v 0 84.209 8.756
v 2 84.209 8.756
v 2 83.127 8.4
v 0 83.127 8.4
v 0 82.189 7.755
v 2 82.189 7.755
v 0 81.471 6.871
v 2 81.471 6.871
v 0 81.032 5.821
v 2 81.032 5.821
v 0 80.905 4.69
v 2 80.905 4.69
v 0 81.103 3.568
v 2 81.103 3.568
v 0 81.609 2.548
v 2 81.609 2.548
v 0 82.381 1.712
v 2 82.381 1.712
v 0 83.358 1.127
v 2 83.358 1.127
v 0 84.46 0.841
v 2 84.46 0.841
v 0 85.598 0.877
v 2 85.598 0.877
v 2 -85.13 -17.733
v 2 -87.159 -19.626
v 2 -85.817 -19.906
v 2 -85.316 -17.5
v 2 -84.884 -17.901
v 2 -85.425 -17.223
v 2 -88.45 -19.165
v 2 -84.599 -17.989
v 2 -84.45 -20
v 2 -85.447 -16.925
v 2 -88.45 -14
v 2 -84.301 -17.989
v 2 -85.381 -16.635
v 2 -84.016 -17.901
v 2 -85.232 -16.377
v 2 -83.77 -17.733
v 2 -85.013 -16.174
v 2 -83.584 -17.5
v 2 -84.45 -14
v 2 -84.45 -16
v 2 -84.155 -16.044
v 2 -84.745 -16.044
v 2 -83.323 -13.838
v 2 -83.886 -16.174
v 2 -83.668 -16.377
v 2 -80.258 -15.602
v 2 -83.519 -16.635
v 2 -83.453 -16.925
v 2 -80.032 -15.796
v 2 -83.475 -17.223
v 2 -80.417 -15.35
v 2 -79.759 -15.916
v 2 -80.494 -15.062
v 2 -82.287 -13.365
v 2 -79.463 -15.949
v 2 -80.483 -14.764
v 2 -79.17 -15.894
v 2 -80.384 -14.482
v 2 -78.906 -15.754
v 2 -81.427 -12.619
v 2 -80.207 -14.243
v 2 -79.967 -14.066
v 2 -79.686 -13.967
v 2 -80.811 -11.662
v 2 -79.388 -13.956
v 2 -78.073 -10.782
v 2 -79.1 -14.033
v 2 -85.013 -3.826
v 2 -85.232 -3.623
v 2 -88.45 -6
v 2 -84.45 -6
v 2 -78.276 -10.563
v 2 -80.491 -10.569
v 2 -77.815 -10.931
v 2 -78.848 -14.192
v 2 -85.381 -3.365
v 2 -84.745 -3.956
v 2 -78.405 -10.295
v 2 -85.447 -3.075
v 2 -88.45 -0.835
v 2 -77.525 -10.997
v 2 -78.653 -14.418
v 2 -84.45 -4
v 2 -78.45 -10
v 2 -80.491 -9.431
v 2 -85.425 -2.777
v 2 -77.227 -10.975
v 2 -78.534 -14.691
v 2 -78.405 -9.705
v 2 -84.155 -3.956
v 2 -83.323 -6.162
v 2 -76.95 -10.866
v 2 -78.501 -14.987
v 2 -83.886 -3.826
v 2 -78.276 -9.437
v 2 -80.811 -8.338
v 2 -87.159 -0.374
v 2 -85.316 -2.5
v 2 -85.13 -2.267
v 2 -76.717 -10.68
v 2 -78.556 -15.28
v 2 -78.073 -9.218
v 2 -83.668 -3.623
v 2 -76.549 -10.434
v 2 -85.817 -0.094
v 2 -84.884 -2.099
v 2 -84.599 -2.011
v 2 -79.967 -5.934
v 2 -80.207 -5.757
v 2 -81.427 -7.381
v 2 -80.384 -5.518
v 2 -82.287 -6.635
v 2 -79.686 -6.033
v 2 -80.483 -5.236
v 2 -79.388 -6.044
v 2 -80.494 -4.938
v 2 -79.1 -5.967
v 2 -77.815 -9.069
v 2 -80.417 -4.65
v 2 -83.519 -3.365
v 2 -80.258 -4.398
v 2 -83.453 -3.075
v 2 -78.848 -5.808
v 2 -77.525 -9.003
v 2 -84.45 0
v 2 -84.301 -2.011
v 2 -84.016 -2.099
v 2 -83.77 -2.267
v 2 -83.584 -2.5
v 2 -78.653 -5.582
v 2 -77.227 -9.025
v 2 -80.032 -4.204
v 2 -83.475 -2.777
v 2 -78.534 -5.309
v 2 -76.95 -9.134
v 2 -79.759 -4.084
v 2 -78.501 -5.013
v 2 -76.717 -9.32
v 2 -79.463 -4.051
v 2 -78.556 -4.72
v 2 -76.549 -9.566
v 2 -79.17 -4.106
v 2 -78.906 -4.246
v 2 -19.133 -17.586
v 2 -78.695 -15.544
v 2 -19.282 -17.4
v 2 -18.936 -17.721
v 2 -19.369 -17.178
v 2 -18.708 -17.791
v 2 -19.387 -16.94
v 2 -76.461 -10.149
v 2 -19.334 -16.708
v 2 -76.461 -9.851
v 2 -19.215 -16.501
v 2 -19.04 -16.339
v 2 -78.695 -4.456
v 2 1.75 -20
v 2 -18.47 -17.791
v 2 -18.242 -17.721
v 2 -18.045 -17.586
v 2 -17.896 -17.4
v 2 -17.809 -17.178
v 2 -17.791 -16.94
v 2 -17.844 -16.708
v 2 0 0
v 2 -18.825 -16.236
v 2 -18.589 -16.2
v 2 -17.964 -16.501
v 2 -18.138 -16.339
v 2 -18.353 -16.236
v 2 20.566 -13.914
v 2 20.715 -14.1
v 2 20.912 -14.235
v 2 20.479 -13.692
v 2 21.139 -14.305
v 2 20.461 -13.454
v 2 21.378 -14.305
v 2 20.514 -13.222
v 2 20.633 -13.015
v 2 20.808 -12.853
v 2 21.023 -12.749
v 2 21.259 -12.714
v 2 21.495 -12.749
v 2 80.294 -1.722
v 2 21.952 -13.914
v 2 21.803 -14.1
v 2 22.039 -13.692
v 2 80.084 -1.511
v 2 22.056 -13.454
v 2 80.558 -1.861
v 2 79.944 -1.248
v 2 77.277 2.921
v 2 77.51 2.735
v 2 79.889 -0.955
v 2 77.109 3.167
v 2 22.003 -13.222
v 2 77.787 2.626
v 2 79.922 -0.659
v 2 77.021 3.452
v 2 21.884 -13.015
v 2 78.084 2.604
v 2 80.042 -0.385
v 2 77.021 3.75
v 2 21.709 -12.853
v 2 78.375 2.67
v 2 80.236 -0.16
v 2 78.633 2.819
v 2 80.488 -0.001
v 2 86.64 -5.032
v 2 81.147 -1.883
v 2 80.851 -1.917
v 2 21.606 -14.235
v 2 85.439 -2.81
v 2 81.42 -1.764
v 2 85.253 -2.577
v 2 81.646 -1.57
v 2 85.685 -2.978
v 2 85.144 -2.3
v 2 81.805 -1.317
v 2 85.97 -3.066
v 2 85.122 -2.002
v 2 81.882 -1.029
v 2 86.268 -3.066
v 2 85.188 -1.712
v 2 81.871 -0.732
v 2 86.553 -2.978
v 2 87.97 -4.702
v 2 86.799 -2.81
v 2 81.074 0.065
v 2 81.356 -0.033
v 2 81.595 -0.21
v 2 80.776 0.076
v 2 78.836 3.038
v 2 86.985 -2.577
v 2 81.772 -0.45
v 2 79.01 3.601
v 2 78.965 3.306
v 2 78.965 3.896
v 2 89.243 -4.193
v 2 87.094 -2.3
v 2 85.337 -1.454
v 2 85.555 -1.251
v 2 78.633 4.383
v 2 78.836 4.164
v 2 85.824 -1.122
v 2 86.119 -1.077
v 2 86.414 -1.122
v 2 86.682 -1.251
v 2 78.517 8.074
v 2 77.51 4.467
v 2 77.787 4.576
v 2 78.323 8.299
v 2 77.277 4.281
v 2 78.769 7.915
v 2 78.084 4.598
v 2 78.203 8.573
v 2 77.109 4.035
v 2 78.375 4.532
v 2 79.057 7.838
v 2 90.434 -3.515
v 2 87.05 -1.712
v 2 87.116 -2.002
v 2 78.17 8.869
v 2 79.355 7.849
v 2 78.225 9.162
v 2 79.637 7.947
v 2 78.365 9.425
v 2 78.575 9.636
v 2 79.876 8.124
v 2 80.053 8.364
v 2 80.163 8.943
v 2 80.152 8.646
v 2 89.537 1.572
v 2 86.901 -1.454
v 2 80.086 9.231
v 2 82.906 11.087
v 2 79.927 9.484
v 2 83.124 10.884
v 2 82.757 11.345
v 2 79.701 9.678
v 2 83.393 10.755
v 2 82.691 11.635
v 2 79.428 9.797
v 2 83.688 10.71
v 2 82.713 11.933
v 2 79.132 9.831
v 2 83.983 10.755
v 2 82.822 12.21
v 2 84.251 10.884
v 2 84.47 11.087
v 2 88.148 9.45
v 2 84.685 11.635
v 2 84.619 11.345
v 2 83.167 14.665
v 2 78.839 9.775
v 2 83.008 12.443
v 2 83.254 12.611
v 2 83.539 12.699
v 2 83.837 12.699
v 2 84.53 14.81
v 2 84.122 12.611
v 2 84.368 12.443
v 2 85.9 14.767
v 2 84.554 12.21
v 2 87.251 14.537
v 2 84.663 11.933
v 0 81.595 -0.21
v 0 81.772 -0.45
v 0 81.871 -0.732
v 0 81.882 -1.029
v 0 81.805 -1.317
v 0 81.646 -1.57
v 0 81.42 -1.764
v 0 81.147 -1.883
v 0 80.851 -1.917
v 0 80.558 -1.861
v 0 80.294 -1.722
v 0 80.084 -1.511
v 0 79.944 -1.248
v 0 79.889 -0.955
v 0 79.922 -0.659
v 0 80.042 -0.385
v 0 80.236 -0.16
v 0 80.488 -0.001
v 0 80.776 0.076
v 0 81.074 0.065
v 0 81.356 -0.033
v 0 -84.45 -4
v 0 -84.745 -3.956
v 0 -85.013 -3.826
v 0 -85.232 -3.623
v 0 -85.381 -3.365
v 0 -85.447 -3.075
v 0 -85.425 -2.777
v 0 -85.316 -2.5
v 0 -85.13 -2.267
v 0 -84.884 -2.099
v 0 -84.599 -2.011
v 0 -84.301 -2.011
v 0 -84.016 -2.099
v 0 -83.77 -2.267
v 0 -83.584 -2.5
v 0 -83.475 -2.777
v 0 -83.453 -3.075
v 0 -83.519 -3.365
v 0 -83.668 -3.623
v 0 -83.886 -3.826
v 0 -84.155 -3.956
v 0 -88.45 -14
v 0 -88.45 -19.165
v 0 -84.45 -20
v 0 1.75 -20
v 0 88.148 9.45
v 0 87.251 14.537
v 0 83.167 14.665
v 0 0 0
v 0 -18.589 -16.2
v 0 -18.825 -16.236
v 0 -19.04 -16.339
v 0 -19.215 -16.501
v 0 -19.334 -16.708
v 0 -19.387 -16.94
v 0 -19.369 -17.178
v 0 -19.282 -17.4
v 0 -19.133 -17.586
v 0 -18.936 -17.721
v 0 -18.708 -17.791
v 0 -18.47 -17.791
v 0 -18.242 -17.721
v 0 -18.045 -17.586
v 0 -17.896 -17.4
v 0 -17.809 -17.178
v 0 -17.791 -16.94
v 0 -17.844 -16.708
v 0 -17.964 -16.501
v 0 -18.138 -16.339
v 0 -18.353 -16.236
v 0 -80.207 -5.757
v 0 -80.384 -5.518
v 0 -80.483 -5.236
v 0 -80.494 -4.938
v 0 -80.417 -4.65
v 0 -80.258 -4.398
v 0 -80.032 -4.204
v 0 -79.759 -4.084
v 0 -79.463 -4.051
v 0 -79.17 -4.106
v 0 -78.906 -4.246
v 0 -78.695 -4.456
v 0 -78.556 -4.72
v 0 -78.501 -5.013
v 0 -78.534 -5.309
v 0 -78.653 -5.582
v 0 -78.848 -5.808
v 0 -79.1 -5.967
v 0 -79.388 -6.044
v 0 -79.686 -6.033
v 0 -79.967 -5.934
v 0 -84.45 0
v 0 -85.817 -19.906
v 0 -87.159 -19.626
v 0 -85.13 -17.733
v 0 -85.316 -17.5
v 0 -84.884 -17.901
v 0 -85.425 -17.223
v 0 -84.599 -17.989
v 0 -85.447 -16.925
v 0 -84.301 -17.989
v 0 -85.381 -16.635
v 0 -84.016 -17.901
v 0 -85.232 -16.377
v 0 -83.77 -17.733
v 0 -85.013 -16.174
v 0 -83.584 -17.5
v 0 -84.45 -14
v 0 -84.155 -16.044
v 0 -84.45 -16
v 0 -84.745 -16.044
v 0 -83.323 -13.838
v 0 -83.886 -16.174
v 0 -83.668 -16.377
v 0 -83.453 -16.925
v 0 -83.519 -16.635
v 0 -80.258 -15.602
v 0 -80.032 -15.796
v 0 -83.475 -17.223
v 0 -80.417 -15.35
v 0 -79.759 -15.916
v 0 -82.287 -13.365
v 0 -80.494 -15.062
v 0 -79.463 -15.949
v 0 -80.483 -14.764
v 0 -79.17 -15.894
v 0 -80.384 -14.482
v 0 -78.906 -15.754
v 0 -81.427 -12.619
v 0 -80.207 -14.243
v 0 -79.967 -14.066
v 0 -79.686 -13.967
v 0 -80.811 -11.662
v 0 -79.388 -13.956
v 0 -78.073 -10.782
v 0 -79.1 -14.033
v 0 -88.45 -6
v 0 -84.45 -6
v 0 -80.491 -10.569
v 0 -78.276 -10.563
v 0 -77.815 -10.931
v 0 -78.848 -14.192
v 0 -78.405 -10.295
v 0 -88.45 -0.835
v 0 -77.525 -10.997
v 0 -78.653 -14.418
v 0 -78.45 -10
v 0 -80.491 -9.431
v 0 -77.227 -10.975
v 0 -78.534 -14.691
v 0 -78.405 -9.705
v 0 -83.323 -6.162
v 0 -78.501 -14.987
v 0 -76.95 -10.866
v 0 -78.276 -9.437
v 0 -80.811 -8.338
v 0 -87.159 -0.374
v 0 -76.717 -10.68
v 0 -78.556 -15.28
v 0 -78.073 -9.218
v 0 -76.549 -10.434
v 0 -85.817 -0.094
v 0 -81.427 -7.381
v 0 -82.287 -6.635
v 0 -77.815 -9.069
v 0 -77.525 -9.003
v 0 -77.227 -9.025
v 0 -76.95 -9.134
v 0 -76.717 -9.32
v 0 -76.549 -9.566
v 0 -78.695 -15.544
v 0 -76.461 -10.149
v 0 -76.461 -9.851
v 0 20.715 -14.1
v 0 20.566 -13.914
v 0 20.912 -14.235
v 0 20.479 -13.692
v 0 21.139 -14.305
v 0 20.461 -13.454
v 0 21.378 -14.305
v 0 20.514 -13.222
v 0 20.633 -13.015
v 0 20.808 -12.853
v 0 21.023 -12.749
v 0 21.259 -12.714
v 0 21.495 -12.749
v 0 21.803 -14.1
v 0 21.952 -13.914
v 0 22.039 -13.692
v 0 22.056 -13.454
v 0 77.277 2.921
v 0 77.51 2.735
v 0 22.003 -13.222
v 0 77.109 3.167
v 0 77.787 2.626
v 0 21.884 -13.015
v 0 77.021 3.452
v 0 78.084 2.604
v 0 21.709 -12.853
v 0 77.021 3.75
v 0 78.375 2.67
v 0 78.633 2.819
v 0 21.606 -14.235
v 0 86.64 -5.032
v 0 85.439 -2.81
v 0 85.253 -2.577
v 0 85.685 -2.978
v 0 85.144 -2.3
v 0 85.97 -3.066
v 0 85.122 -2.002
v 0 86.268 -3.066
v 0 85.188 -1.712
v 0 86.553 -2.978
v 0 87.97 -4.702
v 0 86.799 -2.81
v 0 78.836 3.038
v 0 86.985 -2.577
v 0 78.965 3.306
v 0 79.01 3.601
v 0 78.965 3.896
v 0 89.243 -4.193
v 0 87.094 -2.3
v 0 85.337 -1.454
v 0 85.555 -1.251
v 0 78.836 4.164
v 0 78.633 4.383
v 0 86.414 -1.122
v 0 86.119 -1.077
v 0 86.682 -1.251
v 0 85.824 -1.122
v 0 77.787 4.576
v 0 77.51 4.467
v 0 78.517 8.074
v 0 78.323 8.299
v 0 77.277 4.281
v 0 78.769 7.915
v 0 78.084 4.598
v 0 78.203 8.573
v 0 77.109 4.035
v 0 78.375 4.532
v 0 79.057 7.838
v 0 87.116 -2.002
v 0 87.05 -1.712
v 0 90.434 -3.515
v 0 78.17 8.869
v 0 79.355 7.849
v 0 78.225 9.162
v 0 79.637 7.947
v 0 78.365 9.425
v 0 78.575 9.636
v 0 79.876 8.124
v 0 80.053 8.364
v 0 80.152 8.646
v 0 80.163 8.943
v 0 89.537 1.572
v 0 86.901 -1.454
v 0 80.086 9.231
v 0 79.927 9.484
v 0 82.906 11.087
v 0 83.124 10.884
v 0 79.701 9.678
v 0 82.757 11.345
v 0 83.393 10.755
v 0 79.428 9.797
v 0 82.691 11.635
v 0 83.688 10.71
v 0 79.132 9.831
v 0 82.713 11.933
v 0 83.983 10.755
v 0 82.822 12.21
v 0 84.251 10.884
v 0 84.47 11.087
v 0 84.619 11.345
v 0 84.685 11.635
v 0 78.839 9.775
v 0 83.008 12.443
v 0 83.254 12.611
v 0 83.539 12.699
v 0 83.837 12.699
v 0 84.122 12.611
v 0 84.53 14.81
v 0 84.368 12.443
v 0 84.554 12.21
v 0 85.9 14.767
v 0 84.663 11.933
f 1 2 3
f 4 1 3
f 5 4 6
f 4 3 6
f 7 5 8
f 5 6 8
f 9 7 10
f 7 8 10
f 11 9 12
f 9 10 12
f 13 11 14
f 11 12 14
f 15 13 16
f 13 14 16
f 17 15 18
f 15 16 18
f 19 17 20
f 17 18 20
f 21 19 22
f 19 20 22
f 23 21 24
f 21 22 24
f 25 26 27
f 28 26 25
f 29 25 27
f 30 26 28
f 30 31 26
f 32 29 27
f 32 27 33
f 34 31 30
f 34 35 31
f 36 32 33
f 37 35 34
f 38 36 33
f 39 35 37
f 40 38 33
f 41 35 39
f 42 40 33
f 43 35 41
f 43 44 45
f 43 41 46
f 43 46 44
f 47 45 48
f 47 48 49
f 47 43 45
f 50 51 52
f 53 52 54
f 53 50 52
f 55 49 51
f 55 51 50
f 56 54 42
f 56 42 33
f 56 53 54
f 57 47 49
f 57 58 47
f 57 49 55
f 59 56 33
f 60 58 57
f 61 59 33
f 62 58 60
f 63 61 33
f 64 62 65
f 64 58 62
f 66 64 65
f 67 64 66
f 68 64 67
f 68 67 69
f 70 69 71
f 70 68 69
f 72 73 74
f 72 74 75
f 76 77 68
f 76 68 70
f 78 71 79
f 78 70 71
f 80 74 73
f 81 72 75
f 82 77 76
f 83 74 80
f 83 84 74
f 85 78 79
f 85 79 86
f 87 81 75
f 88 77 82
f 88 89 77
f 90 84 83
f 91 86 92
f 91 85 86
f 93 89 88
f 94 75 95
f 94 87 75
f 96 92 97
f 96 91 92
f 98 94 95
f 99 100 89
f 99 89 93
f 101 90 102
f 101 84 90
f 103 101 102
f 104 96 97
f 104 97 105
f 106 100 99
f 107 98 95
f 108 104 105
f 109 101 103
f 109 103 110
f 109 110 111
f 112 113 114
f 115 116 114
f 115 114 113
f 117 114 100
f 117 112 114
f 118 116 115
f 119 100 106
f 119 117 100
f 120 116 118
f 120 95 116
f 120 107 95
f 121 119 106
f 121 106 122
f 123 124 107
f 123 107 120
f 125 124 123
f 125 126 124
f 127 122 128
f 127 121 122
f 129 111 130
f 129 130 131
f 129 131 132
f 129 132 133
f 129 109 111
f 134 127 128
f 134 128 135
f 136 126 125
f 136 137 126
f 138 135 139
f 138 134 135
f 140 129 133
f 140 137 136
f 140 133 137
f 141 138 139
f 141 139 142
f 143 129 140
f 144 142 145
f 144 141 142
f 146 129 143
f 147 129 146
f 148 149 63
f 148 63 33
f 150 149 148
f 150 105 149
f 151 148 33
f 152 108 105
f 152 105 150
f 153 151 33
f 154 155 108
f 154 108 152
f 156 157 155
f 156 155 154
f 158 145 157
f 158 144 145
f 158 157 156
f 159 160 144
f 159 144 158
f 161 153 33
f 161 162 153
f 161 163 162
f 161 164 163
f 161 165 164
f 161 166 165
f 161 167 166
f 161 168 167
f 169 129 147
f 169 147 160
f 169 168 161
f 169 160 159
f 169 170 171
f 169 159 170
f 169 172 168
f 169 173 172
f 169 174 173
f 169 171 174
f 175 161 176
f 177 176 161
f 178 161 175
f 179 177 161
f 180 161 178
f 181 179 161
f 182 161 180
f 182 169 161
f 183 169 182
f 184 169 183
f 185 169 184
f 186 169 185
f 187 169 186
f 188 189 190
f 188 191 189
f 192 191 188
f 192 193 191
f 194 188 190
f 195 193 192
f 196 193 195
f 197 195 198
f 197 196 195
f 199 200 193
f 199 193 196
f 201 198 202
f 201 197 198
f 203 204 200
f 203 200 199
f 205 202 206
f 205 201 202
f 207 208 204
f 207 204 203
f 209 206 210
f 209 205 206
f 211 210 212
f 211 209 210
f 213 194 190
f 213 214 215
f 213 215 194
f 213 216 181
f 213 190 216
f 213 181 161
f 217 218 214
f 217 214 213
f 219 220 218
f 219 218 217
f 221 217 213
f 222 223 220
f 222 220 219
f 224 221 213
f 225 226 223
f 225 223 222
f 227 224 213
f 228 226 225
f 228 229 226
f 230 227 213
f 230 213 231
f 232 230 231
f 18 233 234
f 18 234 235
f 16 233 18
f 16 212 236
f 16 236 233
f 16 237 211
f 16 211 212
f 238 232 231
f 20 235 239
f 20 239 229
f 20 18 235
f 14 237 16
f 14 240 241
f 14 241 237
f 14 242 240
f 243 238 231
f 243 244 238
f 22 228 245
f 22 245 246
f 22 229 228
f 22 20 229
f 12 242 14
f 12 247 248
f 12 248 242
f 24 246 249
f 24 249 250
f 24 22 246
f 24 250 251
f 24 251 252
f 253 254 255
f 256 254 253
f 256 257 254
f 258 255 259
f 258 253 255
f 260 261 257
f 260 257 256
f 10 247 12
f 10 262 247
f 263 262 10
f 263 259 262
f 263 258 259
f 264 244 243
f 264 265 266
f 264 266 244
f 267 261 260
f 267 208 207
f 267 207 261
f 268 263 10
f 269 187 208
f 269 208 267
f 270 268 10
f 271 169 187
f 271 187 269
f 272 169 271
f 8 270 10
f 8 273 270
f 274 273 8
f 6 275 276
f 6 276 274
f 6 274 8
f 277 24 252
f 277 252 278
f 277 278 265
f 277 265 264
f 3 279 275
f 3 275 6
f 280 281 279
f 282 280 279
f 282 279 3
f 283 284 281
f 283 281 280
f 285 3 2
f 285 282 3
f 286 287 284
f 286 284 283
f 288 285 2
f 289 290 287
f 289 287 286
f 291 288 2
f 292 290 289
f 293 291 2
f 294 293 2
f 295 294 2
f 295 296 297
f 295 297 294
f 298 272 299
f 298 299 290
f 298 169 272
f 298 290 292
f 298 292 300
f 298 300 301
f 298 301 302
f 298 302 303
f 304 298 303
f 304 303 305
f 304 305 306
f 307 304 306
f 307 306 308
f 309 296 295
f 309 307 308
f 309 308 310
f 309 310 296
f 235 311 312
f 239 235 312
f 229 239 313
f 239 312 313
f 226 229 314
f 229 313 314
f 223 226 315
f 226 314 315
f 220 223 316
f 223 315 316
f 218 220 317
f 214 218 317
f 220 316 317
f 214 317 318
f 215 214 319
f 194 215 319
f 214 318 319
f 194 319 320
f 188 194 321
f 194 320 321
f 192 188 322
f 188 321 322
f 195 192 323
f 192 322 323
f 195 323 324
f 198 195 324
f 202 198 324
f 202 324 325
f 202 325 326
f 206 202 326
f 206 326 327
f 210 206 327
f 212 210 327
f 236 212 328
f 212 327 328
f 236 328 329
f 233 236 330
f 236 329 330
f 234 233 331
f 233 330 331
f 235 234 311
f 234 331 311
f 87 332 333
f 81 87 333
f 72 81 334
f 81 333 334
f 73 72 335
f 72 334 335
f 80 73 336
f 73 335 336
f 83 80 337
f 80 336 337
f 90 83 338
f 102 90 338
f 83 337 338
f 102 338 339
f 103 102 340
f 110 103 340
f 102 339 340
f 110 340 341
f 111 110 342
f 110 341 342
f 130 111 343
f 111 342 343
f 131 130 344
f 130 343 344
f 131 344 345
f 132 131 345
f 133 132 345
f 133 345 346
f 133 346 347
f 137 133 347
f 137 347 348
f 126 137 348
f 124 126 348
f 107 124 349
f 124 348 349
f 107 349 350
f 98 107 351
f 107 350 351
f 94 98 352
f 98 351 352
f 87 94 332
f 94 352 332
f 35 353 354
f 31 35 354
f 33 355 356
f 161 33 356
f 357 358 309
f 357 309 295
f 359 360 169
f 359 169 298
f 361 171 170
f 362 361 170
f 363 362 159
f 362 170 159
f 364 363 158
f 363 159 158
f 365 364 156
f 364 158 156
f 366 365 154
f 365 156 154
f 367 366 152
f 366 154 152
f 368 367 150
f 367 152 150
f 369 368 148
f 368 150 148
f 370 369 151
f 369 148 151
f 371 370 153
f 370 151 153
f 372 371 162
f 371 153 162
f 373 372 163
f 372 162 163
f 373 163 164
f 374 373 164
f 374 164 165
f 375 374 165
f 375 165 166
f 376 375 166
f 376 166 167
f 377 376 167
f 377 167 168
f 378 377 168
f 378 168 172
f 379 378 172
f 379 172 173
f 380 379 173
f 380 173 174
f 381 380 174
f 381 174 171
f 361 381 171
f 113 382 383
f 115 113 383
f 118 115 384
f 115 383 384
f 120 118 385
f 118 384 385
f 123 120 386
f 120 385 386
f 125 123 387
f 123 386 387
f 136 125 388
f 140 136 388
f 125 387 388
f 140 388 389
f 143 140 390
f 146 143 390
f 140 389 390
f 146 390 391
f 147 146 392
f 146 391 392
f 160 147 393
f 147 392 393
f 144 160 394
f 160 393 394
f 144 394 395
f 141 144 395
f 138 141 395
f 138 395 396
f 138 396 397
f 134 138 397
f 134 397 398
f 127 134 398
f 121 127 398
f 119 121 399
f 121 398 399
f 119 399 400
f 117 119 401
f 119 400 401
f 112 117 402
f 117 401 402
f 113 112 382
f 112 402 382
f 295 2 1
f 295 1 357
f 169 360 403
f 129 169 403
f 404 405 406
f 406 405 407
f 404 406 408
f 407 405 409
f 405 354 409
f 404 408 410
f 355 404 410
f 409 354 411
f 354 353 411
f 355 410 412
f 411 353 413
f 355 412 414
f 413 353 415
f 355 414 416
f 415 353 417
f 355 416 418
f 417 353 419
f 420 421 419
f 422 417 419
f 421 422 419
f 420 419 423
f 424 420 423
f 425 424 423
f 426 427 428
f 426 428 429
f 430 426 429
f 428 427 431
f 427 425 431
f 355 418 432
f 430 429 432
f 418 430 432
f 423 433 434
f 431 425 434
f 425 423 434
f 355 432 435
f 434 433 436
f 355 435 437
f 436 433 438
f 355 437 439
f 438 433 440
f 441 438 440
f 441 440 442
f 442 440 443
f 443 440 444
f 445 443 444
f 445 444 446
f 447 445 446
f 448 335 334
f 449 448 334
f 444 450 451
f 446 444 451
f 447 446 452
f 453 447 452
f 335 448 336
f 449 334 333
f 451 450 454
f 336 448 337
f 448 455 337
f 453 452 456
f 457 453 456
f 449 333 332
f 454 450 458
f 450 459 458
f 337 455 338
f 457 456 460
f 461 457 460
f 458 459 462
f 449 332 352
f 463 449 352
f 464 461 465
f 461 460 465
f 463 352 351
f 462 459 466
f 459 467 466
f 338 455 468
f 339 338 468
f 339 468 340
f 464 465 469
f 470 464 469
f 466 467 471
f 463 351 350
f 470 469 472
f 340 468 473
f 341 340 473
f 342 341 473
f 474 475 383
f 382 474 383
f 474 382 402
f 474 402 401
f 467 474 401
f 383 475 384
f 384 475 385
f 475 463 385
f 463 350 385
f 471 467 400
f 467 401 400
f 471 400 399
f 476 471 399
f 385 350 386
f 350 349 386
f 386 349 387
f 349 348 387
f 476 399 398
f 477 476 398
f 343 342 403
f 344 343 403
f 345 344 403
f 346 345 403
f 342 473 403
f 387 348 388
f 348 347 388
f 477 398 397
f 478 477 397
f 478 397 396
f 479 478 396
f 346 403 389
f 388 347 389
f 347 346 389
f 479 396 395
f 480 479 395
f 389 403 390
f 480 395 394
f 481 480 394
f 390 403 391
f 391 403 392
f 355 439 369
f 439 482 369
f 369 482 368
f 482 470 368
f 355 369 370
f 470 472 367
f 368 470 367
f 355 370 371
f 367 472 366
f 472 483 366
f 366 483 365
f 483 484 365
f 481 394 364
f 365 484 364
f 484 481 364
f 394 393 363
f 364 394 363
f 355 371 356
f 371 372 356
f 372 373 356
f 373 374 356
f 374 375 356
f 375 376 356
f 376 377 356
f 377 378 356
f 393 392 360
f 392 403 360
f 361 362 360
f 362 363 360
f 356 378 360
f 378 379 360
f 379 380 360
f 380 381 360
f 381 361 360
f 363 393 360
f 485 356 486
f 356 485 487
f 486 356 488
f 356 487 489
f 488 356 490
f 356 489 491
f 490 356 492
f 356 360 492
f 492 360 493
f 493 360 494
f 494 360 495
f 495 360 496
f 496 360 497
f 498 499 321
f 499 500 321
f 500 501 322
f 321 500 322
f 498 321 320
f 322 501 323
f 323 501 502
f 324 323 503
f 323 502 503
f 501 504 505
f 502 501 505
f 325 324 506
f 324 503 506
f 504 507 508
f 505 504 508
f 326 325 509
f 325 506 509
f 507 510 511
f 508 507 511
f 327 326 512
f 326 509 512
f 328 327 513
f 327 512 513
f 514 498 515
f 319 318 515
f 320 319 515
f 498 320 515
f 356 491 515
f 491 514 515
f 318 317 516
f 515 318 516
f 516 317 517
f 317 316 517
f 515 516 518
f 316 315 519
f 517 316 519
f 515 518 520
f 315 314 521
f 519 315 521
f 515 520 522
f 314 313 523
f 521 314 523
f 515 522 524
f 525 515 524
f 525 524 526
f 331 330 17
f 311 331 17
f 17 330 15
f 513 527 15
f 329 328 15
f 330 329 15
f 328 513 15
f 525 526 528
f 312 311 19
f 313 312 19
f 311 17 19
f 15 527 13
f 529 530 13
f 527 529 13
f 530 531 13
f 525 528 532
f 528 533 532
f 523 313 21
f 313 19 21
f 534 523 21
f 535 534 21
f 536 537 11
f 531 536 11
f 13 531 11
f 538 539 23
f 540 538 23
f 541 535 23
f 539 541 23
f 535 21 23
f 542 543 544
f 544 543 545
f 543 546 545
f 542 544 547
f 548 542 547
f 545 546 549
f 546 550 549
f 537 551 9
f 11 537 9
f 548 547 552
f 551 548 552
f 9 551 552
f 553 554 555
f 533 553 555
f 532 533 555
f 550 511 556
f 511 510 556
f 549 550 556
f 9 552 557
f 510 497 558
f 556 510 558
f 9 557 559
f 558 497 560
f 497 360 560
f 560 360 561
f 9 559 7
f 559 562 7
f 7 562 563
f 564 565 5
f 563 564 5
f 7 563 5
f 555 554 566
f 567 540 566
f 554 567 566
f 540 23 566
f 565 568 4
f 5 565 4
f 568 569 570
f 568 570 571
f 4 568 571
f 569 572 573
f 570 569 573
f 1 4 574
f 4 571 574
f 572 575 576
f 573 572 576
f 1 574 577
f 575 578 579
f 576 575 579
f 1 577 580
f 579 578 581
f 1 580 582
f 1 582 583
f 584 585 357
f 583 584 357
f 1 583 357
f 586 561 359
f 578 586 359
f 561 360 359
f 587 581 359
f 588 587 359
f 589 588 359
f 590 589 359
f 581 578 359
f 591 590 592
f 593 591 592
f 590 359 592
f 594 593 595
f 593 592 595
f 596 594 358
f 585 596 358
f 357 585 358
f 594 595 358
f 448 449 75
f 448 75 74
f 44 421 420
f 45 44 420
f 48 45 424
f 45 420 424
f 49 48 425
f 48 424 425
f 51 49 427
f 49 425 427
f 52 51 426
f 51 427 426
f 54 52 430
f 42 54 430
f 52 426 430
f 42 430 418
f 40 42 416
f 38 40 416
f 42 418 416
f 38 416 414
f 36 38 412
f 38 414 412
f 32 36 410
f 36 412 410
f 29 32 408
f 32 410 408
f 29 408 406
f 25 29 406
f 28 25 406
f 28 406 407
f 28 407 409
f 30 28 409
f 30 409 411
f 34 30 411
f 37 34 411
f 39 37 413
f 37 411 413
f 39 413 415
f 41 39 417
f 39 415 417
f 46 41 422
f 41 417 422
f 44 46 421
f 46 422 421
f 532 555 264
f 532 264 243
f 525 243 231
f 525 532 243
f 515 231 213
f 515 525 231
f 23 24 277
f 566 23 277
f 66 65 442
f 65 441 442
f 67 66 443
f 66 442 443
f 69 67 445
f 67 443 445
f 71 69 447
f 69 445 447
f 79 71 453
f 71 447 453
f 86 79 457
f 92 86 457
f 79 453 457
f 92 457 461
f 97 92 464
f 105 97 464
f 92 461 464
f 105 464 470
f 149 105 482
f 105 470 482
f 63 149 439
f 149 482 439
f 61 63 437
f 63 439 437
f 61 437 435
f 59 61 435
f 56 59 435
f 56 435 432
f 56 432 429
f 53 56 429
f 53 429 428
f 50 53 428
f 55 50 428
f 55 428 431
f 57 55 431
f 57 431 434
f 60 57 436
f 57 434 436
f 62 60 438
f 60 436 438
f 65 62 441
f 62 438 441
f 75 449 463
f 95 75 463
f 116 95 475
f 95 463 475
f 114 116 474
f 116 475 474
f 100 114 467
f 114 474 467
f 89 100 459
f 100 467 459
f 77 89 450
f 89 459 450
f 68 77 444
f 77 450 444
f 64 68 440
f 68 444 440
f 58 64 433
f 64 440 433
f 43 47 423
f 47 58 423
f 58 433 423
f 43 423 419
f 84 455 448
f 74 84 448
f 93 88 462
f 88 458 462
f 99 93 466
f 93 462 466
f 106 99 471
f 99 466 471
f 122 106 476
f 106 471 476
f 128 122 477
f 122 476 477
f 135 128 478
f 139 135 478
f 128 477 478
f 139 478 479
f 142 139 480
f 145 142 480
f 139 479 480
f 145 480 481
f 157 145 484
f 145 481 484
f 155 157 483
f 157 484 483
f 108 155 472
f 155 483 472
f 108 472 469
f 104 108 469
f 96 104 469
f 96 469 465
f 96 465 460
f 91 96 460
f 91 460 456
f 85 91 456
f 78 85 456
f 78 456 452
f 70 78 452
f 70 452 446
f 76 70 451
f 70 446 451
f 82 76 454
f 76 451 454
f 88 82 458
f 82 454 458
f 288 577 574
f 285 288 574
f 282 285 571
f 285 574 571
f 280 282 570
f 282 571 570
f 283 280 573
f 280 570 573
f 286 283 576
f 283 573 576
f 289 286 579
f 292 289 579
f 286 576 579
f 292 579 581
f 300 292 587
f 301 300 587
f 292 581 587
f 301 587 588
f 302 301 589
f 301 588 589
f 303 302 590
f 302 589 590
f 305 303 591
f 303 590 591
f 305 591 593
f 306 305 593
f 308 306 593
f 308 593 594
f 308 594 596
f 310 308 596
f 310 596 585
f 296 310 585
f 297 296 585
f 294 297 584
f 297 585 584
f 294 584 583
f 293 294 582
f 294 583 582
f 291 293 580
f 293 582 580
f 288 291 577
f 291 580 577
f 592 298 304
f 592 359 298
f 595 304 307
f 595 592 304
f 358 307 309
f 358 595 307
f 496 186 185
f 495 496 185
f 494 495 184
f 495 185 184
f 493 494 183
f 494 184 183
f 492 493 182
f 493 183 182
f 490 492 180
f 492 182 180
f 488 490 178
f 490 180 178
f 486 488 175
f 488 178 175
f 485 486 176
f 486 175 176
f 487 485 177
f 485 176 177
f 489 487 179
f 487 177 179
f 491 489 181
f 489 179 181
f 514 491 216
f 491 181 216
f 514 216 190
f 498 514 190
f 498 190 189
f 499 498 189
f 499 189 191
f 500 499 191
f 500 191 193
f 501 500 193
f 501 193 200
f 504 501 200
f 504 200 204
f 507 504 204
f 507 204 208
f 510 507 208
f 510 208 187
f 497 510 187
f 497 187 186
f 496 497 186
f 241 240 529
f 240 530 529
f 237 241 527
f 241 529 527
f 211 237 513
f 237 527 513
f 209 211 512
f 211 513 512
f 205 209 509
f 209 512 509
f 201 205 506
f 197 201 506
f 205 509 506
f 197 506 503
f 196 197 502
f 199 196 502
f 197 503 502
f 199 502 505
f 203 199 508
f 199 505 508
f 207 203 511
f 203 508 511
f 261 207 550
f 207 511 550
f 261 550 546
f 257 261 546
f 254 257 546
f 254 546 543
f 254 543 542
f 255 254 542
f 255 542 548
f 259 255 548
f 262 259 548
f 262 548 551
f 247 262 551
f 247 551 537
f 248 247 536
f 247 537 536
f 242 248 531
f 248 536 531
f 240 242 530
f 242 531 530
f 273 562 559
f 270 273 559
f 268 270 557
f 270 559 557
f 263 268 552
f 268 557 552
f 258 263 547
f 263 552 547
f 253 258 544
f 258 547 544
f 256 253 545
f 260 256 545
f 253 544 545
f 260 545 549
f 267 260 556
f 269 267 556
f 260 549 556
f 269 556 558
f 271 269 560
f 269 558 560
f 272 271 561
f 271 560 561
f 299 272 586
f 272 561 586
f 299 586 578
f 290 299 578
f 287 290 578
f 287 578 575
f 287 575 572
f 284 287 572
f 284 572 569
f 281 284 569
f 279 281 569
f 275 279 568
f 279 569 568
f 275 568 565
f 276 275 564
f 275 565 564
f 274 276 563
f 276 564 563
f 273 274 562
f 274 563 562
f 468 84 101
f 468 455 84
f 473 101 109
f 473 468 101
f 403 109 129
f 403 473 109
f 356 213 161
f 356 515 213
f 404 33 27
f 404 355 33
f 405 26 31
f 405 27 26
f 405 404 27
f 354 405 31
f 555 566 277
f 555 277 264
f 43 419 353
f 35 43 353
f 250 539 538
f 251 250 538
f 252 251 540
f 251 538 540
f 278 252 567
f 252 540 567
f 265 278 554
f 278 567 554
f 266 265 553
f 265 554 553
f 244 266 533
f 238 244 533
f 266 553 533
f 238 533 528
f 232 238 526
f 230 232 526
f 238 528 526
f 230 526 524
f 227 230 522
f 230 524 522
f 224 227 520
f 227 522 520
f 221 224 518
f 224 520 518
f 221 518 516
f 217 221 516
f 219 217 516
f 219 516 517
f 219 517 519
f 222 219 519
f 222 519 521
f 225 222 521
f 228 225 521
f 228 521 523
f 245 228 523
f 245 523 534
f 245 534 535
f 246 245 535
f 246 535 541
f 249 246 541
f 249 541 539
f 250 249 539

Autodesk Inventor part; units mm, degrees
ref_plane "YZ Plane" through (0, 0, 0) normal (1, 0, 0) x (0, 1, 0)
ref_plane "XZ Plane" through (0, 0, 0) normal (0, 1, 0) x (-1, 0, 0)
ref_plane "XY Plane" through (0, 0, 0) normal (0, 0, 1) x (1, 0, 0)
sketch "スケッチ2" plane through (0, 0, 0) normal (1, 0, 0) x (0, 1, 0)
  line L0 (0, 0) -> (-84.4498, 0)
  line L1 (-84.4498, -20) -> (1.7498, -20)
  line L2 (0, 0) -> (83.1668, 14.6646)
  line L3 (86.6398, -5.0316) -> (1.7498, -20)
  arc A0 (87.251, 14.537) -> (83.1668, 14.6646) centre (84.9033, 4.8165) ccw
  arc A1 (86.6398, -5.0316) -> (90.434, -3.5148) centre (84.9033, 4.8165) ccw
  arc A2 (-88.4498, -19.1652) -> (-84.4498, -20) centre (-84.4498, -10) ccw
  arc A3 (-84.4498, 0) -> (-88.4498, -0.8348) centre (-84.4498, -10) ccw
  arc A4 (-84.4498, -14) -> (-84.4498, -6) centre (-84.4498, -10) ccw
  line L4 (-84.4498, -6) -> (-88.4498, -6)
  line L5 (-84.4498, -14) -> (-88.4498, -14)
  line L6 (-88.4498, -0.8348) -> (-88.4498, -6)
  line L7 (-88.4498, -14) -> (-88.4498, -19.1652)
  line L8 (87.251, 14.537) -> (88.1479, 9.4503)
  line L9 (89.5371, 1.5718) -> (90.434, -3.5148)
  line L10 (1.7498, -20) -> (0, 0)
  line L11 (88.1479, 9.4503) -> (89.5371, 1.5718)
  dimension "d21" = 20
  dimension "d22" = 10
  dimension "d23" = 170
  dimension "d27" = 10
  dimension "d31" = 8
  dimension "d33" = 4
  dimension "d35" = 4
  dimension "d36" = 170
  dimension "d139" = 20
extrude "押し出し1" add sketch "スケッチ2" along normal blind 2
sketch "スケッチ4" plane through (0, 0, 0) normal (-1, 0, 0) x (0, 0, 1)
  line L0 (-20, 1.7498) -> (-5.0316, 86.6398) projected
  line L1 (-20, -84.4498) -> (-20, 1.7498) projected
  circle A0 centre (-17, -18.5891) radius 1
  circle A1 centre (-13.5138, 21.2587) radius 1
  line L2 (-17, -18.5891) -> (-13.5138, 21.2587)
  line L3 (-20, 1.7498) -> (0, 0)
  dimension "d57" = 2
  dimension "d59" = 40
  dimension "d60" = 175
  dimension "d61" = 3
  dimension "d62" = 3
hole "穴2" at (0, -18.5891, -17) at (0, 21.2587, -13.5138) direction (1, 0, 0) diameter 1.6 end through all
sketch "スケッチ6" plane through (2, 0, 0) normal (1, 0, 0) x (0, 0, -1)
  line L0 (20, 1.7498) -> (5.0316, 86.6398) projected
  arc A0 (5.0316, 86.6398) -> (3.5148, 90.434) centre (-4.8165, 84.9033) ccw projected
  line L1 (3.5148, 90.434) -> (-14.537, 87.251) projected
  arc A1 (-14.537, 87.251) -> (-14.6646, 83.1668) centre (-4.8165, 84.9033) ccw projected
  line L2 (-14.6646, 83.1668) -> (0, 0) projected
  line L3 (-9.3978, 53.2975) -> (-12.6117, 57.1277)
  line L4 (-14.537, 87.251) -> (-17.8212, 86.6719)
  line L5 (-17.8212, 86.6719) -> (-12.6117, 57.1277)
  line L6 (3.5148, 90.434) -> (6.799, 91.0131)
  line L7 (6.799, 91.0131) -> (12.0085, 61.4689)
  line L8 (12.0085, 61.4689) -> (10.2984, 56.7704)
  dimension "d75" = 150
  dimension "d76" = 150
  dimension "d77" = 2.5
  dimension "d78" = 2.5
  dimension "d79" = 30
extrude "押し出し2" [suppressed]
sketch "スケッチ5" plane through (2, 0, 0) normal (1, 0, 0) x (0, 0, -1)
  line L0 (3.5148, 90.434) -> (-14.537, 87.251) projected
  circle A0 centre (-12.5213, 82.5293) radius 1.5
  circle A1 centre (3.2356, 85.3077) radius 1.5
  line L1 (5.0316, 86.6398) -> (20, 1.7498) projected
  line L2 (20, 1.7498) -> (20, -84.4498) projected
  arc A2 (19.1652, -88.4498) -> (20, -84.4498) centre (10, -84.4498) ccw projected
  line L3 (19.1652, -88.4498) -> (14, -88.4498) projected
  line L4 (14, -88.4498) -> (14, -84.4498) projected
  arc A3 (14, -84.4498) -> (6, -84.4498) centre (10, -84.4498) ccw projected
  line L5 (6, -84.4498) -> (6, -88.4498) projected
  line L6 (6, -88.4498) -> (0.8348, -88.4498) projected
  arc A4 (0, -84.4498) -> (0.8348, -88.4498) centre (10, -84.4498) ccw projected
  line L7 (0, -84.4498) -> (0, 0) projected
  line L8 (0, 0) -> (-14.6646, 83.1668) projected
  circle A5 centre (17, -18.5891) radius 0.8 projected
  circle A6 centre (13.5138, 21.2587) radius 0.8 projected
  arc A7 (-14.537, 87.251) -> (-14.6646, 83.1668) centre (-4.8165, 84.9033) ccw projected
  line L9 (-14.537, 87.251) -> (3.5148, 90.434) projected
  arc A8 (5.0316, 86.6398) -> (3.5148, 90.434) centre (-4.8165, 84.9033) ccw projected
  dimension "d70" = 5
  dimension "d71" = 5
  dimension "d72" = 3
  dimension "d114" = 16
hole "穴3" [suppressed]
sketch "スケッチ7" plane through (2, 0, 0) normal (1, 0, 0) x (0, 0, -1)
  arc A0 (0, -84.4498) -> (0.8348, -88.4498) centre (10, -84.4498) ccw projected
  line L0 (0.8348, -88.4498) -> (6, -88.4498) projected
  circle A1 centre (3, -84.4498) radius 1
  dimension "d89" = 4
  dimension "d90" = 7
  dimension "d91" = 2
hole "穴4" at (2, -84.4498, -3) direction (-1, 0, 0) diameter 2 end through all
pattern_circular "円形状パターン3" count 5 over 180 about axis through (0, -84.4498, -10) along (-1, 0, 0) of "穴4"
sketch "スケッチ8" plane through (2, 0, 0) normal (1, 0, 0) x (0, 0, -1)
  line L0 (3.5148, 90.434) -> (-14.537, 87.251) projected
  line L1 (-17.8212, 86.6719) -> (-12.6117, 57.1277) projected
  circle A0 centre (-11.4794, 76.6205) radius 1.5
  circle A1 centre (4.2775, 79.3988) radius 1.5
  point P0 (6.799, 91.0131)
  dimension "d102" = 11
  dimension "d103" = 11
  dimension "d104" = 16
  dimension "d105" = 4.5
  dimension "d106" = 3
hole "穴5" [suppressed]
sketch "スケッチ11" plane through (2, 0, 0) normal (1, 0, 0) x (0, 0, -1)
  circle A0 centre (-11.4794, 76.6205) radius 1.75 projected
  circle A1 centre (4.2775, 79.3988) radius 1.75 projected
  line L0 (-17.8212, 86.6719) -> (-12.6117, 57.1277) projected
  circle A2 centre (-8.8747, 61.8483) radius 1.5
  circle A3 centre (6.8822, 64.6267) radius 1.5
  dimension "d124" = 3
  dimension "d126" = 16
  dimension "d127" = 15
  dimension "d128" = 4.5
  dimension "d130" = 15
hole "穴6" [suppressed]
sketch "スケッチ13" plane through (2, 0, 0) normal (1, 0, 0) x (0, 0, -1)
  line L0 (0, 0) -> (0, -84.4498) projected
  line L1 (20, -84.4498) -> (20, 1.7498) projected
  line L2 (20, 1.7498) -> (5.0316, 86.6398) projected
  line L3 (3.5148, 90.434) -> (-14.537, 87.251) projected
  line L4 (-14.6646, 83.1668) -> (0, 0) projected
  line L5 (-3.8662, 44.9615) -> (9.2538, 39.6592)
  line L6 (9.2538, 39.6592) -> (6.6491, 54.4313)
  line L7 (6.6491, 54.4313) -> (-3.8662, 44.9615)
  line L8 (-2.1297, 35.1134) -> (10.9903, 29.8111)
  line L9 (10.9903, 29.8111) -> (0.475, 20.3413)
  line L10 (0.475, 20.3413) -> (-2.1297, 35.1134)
  line L11 (2.7324, 7.5388) -> (13.2477, 17.0086)
  line L12 (13.2477, 17.0086) -> (15.8525, 2.2365)
  line L13 (15.8525, 2.2365) -> (2.7324, 7.5388)
  line L14 (4, -2.2635) -> (16, -9.7635)
  line L15 (4, -17.2635) -> (4, -2.2635)
  line L16 (16, -9.7635) -> (4, -17.2635)
  line L17 (4, -30.2635) -> (16, -22.7635)
  line L18 (16, -22.7635) -> (16, -37.7635)
  line L19 (16, -37.7635) -> (4, -30.2635)
  line L20 (4, -55.2635) -> (16, -47.7635)
  line L21 (16, -47.7635) -> (4, -40.2635)
  line L22 (4, -40.2635) -> (4, -55.2635)
  line L23 (4, -65.2635) -> (16, -57.7635)
  line L24 (16, -57.7635) -> (16, -72.7635)
  line L25 (16, -72.7635) -> (4, -65.2635)
  point P0 (10.2984, 56.7704)
  point P1 (6.799, 91.0131)
  point P2 (-17.8212, 86.6719)
  point P3 (-9.3978, 53.2975)
  dimension "d141" = 15
  dimension "d144" = 4
  dimension "d145" = 36
  dimension "d146" = 12
  dimension "d147" = 4
  dimension "d149" = 4
  dimension "d160" = 4
  dimension "d162" = 61
  dimension "d163" = 74
  dimension "d164" = 12
  dimension "d165" = 13
  dimension "d166" = 4
  dimension "d167" = 4
  dimension "d168" = 10
  dimension "d169" = 4
  dimension "d170" = 10
extrude "押し出し4" [suppressed]
fillet "フィレット1" [suppressed]
sketch "スケッチ14" plane through (2, 0, 0) normal (1, 0, 0) x (0, 0, -1)
  line L0 (3.5148, 90.434) -> (-14.537, 87.251) projected
  arc A0 (-14.537, 87.251) -> (-14.6646, 83.1668) centre (-4.8165, 84.9033) ccw projected
  arc A1 (-8.7557, 84.2087) -> (-0.8772, 85.5979) centre (-4.8165, 84.9033) ccw
  line L1 (-8.7557, 84.2087) -> (-9.4503, 88.1479)
  line L2 (-0.8772, 85.5979) -> (-1.5718, 89.5371)
  dimension "d174" = 8
extrude "押し出し5" cut sketch "スケッチ14" against normal blind 2
sketch "スケッチ15" plane through (2, 0, 0) normal (1, 0, 0) x (0, 0, -1)
  line L0 (-9.4503, 88.1479) -> (-14.537, 87.251) projected
  arc A0 (-14.537, 87.251) -> (-14.6646, 83.1668) centre (-4.8165, 84.9033) ccw projected
  circle A1 centre (-11.7101, 83.6878) radius 1
  dimension "d178" = 2
  dimension "d180" = 4
  dimension "d181" = 7
hole "穴7" at (2, 83.6878, 11.7101) direction (-1, 0, 0) diameter 2 end through all
pattern_circular "円形状パターン4" count 5 over 180 about axis through (2, 84.9033, 4.8165) along (1, 0, 0) of "穴7"
properties part number "Arm_Link_1" material "アルミニウム 6061"
